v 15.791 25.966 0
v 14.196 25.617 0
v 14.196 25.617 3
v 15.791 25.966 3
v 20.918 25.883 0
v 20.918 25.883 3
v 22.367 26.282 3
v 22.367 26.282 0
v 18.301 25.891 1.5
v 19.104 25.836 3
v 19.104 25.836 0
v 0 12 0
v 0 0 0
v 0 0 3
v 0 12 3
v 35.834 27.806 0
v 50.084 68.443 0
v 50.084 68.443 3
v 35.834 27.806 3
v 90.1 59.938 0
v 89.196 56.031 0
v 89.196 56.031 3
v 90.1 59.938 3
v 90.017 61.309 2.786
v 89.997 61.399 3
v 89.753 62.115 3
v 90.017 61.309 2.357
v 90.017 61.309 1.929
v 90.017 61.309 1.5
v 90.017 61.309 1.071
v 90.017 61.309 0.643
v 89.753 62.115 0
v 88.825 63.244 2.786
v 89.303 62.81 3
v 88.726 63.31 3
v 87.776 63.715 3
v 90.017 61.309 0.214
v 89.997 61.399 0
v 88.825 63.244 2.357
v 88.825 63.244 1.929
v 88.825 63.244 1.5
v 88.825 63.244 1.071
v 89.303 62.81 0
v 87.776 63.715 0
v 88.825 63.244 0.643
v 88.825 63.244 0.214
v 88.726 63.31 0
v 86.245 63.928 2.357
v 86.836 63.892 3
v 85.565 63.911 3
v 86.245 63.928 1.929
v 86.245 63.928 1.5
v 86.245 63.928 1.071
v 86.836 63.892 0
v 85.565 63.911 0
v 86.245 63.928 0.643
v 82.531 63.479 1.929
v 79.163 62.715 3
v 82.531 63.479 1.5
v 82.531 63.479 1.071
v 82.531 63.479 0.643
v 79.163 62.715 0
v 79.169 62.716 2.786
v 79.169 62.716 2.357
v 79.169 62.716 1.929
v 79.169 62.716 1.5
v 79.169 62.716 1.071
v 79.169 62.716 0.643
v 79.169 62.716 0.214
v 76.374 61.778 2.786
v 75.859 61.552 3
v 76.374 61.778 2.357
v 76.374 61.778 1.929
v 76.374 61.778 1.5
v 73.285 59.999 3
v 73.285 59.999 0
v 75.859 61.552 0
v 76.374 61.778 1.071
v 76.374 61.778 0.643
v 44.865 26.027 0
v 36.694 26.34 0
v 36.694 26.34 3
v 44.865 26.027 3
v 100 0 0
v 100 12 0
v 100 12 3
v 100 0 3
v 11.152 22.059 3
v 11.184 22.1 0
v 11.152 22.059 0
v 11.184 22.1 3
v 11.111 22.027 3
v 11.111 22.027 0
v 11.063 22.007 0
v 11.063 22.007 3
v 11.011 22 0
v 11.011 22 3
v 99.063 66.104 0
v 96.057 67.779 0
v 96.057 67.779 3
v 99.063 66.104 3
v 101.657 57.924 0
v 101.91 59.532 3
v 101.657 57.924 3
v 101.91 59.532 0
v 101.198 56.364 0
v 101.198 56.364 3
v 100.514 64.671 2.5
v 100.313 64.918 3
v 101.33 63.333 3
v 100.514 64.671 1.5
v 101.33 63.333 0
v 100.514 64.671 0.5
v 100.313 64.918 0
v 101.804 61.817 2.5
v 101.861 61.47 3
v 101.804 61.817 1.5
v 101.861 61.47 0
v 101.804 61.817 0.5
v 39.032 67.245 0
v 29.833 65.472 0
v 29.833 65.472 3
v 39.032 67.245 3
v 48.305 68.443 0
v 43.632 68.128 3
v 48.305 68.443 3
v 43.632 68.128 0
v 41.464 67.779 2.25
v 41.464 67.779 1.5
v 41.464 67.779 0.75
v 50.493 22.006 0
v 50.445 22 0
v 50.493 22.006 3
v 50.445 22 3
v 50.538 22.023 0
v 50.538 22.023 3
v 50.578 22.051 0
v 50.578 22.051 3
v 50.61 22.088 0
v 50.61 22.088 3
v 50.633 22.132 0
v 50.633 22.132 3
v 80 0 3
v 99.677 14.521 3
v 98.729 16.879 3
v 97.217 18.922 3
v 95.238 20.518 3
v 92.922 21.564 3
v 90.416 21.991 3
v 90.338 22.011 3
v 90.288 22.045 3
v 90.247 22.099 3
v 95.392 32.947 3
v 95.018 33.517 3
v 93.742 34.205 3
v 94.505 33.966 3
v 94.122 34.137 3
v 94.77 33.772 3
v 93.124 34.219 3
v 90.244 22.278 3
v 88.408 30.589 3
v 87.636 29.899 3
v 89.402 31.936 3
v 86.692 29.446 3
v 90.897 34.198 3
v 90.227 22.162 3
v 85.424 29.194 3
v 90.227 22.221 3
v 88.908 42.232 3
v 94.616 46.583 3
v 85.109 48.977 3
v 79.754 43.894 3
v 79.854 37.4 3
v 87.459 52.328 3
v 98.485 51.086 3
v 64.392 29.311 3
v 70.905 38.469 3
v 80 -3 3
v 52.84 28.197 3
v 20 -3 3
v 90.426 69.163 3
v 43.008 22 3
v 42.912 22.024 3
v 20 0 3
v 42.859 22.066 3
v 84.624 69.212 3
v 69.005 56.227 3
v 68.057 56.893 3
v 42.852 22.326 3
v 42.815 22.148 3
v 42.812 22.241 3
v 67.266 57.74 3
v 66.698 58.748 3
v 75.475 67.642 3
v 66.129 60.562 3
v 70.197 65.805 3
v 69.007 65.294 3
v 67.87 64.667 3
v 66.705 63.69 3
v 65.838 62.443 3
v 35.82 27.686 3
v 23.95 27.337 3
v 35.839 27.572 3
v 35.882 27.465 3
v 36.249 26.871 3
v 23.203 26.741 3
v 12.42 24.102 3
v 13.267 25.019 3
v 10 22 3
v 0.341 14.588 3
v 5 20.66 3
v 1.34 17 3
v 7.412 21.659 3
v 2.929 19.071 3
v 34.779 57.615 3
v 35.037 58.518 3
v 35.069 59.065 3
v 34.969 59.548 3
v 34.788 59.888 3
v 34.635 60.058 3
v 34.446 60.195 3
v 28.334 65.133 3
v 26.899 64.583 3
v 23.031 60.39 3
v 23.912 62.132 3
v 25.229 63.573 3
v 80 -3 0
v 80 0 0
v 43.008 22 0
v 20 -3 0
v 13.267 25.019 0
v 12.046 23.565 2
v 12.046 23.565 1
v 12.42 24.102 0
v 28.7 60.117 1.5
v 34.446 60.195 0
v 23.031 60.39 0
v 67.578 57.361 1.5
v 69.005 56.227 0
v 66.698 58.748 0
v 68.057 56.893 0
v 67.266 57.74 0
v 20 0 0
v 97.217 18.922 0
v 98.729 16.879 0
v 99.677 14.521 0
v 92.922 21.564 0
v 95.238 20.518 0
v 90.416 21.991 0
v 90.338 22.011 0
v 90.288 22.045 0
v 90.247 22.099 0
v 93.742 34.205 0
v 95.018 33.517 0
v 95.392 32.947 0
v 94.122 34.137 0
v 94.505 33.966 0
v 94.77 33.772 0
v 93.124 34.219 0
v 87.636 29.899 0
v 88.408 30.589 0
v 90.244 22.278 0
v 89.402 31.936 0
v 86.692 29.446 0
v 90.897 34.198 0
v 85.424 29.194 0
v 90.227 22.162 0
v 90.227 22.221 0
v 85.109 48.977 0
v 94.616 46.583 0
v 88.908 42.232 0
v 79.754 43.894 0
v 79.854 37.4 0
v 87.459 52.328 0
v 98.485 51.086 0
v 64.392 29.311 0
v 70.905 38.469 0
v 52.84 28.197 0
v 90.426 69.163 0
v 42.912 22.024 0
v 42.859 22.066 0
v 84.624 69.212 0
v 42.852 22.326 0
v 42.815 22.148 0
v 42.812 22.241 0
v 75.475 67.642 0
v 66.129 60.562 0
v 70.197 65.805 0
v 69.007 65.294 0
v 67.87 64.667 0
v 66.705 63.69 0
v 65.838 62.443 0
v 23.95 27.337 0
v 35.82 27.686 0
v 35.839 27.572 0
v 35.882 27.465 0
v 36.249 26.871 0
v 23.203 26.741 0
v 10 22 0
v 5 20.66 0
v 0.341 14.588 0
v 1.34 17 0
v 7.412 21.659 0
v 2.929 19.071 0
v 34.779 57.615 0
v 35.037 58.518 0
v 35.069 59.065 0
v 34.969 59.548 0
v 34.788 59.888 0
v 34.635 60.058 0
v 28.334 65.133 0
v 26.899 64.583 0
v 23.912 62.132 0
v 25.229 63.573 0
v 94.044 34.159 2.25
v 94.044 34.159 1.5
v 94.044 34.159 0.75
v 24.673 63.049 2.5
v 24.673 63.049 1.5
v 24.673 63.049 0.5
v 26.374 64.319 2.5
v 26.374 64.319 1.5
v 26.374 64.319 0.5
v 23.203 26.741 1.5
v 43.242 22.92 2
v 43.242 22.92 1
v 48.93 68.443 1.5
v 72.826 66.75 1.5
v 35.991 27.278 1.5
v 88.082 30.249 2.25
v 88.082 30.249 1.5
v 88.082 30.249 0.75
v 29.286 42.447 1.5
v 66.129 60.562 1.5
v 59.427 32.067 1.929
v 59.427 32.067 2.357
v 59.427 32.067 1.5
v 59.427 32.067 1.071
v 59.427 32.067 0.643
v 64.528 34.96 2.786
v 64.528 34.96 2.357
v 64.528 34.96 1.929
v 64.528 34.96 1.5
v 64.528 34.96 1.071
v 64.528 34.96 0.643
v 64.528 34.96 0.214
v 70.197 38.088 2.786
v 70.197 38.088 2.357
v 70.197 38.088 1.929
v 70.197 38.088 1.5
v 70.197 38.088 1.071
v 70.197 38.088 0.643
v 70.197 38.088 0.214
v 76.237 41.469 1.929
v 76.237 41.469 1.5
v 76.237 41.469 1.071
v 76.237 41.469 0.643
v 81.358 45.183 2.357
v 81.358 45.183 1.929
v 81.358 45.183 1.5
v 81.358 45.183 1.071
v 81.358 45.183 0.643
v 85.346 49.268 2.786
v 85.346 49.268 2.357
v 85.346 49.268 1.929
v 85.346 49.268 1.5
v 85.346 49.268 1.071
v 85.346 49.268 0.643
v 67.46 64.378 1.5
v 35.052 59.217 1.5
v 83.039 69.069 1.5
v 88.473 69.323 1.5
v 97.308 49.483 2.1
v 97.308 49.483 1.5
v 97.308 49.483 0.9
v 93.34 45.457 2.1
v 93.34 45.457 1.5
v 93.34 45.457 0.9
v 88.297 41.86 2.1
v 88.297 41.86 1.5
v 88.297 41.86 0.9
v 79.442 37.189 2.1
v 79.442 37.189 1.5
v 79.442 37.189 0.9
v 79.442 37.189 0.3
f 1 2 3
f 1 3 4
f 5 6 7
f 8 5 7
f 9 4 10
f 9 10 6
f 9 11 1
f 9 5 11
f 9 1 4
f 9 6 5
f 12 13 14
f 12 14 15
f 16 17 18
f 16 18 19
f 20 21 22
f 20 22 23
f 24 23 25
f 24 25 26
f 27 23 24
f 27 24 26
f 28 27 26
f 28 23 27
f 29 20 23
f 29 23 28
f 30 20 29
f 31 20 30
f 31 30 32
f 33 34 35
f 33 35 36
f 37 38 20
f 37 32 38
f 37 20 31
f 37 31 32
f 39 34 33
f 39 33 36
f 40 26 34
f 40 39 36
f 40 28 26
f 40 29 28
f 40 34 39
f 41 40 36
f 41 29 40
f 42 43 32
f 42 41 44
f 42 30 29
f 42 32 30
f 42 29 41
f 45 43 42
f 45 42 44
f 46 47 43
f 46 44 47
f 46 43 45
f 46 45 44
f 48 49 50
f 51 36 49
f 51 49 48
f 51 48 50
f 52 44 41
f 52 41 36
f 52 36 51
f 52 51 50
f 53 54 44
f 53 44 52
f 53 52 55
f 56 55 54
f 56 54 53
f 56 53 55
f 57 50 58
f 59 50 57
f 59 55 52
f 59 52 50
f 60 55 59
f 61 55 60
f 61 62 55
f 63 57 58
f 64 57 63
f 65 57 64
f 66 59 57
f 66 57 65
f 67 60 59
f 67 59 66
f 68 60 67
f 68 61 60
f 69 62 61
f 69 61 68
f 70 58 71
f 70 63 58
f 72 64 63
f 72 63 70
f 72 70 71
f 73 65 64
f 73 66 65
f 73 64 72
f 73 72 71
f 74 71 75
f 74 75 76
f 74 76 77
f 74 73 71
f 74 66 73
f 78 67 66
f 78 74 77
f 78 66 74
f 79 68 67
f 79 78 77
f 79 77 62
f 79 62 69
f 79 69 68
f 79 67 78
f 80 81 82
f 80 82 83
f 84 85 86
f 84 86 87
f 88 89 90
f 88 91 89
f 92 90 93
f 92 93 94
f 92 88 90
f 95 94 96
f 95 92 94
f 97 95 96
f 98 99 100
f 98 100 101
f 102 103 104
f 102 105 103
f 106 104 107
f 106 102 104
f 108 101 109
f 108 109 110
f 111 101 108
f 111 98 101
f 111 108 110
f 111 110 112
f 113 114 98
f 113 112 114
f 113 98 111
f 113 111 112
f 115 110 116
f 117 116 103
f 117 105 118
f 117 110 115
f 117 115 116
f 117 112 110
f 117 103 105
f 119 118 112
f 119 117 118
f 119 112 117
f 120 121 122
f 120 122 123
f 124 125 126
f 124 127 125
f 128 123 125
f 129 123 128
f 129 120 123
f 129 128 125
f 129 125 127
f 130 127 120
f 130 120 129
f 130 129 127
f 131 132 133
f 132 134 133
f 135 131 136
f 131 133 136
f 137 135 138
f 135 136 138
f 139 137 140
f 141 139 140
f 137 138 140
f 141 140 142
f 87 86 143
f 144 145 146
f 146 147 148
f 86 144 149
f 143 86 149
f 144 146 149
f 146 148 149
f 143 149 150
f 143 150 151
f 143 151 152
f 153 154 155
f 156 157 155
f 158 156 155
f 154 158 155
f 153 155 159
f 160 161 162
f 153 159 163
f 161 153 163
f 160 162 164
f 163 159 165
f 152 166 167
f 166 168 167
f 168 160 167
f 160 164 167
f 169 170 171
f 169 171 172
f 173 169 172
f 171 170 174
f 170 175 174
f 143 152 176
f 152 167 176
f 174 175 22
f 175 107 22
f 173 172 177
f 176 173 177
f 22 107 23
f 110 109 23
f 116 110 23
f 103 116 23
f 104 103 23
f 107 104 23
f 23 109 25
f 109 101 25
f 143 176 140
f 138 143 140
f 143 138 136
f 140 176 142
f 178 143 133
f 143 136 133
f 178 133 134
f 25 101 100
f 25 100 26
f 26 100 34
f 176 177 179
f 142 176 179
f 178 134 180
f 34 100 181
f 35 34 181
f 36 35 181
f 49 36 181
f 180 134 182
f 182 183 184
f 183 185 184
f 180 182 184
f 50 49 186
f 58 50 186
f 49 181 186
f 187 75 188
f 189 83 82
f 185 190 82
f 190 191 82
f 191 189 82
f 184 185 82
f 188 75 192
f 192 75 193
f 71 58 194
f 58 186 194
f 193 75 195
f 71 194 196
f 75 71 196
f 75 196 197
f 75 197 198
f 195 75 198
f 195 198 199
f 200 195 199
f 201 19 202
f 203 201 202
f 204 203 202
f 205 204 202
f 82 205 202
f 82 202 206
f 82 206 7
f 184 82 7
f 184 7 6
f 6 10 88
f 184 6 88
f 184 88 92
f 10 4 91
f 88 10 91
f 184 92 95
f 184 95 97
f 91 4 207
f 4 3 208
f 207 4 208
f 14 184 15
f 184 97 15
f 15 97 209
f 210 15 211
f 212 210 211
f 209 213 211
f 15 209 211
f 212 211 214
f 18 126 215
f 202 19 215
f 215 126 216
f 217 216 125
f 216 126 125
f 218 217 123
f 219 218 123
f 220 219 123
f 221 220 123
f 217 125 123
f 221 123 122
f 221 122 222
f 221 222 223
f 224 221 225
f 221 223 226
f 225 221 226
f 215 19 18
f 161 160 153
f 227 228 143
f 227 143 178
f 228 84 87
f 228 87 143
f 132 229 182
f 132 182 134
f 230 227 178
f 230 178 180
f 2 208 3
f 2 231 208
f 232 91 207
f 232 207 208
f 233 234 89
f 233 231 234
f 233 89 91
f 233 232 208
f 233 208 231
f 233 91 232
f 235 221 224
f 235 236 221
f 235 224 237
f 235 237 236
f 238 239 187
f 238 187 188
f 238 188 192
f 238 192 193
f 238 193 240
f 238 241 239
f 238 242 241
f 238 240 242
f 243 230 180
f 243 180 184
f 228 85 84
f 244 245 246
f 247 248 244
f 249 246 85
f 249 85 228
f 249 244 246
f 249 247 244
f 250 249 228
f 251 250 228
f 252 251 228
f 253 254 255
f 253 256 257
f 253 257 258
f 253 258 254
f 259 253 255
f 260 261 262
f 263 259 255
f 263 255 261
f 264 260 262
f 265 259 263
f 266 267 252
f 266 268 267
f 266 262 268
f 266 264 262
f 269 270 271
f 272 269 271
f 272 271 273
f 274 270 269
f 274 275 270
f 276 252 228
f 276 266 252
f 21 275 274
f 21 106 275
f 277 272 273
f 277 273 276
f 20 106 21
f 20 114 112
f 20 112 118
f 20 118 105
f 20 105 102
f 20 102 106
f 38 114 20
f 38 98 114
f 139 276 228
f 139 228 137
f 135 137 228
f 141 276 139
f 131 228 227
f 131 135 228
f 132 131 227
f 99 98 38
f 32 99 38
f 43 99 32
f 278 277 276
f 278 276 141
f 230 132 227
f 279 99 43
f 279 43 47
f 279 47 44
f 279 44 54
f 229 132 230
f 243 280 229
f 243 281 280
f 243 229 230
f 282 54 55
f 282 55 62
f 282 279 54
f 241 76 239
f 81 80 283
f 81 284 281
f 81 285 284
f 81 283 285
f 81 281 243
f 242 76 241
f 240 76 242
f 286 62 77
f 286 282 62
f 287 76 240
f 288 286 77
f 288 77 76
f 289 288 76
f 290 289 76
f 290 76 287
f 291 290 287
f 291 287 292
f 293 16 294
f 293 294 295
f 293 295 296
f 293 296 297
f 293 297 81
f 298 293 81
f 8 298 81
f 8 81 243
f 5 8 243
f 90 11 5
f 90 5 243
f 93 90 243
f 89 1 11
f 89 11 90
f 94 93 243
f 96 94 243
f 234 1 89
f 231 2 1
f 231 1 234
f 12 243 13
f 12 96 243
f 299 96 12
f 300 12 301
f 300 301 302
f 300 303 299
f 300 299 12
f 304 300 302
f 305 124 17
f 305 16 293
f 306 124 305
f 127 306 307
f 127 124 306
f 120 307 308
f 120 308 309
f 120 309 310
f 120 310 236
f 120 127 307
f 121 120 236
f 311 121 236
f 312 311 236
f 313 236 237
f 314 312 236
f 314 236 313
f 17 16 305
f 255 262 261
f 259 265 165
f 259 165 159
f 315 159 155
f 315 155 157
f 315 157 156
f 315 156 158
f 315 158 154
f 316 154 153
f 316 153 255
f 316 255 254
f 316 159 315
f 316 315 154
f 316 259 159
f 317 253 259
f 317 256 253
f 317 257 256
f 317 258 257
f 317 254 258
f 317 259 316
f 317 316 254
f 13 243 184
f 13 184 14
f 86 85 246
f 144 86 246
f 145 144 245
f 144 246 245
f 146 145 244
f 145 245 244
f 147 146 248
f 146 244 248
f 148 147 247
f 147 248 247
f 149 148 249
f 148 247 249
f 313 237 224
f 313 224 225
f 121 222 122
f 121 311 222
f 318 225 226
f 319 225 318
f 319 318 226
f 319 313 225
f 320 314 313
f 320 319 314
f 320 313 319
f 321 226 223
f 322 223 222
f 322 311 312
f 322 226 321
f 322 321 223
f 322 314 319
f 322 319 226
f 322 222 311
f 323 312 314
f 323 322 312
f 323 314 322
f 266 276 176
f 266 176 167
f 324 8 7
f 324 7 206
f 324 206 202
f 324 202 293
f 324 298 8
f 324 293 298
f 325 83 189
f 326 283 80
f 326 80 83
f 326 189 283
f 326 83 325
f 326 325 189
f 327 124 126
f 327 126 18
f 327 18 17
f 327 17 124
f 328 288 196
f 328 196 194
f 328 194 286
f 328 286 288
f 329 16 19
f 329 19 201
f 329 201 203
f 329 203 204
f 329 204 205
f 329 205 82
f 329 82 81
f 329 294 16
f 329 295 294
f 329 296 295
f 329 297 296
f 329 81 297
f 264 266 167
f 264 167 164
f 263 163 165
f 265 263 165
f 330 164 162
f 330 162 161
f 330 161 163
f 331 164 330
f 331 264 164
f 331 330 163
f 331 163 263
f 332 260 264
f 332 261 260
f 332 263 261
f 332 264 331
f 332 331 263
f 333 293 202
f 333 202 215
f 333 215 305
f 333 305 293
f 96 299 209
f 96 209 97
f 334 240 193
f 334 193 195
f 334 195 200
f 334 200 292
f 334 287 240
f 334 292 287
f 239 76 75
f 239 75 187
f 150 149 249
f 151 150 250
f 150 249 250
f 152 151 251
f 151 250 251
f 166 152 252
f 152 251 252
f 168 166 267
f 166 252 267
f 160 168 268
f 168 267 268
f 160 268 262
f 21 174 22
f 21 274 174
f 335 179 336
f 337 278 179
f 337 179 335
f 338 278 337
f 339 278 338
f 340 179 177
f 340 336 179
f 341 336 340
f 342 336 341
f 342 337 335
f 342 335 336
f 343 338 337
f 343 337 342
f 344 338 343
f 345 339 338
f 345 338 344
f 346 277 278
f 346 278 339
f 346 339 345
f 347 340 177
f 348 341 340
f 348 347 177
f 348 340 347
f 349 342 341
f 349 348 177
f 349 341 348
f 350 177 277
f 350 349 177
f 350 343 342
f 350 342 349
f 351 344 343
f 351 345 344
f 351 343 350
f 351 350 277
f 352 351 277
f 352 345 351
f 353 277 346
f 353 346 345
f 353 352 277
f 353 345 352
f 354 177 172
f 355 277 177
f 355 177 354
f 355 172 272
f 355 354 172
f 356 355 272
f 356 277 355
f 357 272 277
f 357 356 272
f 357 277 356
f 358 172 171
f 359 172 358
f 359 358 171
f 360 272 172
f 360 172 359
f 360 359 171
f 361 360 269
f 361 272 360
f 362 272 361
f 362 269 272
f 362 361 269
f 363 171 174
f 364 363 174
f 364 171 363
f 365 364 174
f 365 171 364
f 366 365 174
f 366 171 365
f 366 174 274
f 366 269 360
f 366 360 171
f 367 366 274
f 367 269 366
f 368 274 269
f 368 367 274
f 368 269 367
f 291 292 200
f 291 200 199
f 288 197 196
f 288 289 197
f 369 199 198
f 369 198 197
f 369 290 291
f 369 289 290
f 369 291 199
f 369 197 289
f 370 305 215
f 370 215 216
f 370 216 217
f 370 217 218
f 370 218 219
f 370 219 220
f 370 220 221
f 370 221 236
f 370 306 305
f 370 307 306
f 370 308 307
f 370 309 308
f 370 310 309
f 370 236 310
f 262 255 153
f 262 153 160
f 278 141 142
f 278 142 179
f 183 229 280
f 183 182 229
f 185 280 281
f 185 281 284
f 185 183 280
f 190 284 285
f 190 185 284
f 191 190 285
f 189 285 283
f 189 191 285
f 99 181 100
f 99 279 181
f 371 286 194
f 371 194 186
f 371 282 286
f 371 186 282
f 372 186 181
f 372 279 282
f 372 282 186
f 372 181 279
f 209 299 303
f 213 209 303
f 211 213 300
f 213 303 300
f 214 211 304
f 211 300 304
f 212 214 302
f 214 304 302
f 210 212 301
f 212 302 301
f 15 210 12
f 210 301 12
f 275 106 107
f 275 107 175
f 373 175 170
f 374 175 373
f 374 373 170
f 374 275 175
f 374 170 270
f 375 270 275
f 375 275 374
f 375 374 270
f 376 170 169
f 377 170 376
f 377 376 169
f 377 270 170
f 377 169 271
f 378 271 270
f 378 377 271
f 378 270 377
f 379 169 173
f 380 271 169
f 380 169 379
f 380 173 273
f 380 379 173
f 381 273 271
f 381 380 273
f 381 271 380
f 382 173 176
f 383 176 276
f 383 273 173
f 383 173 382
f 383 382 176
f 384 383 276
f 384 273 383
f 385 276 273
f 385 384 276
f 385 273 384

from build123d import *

# Parameters (mm, degrees)
BOSS_EXTRUDE1_DEPTH = 3
FILLET1_R           = 10
FILLET2_R           = 0.2


with BuildPart() as part:
    # Sketch1 → Boss-Extrude1 (new body)
    with BuildSketch(Plane.XY):
        with BuildLine():
            Line((42.537984076, 22.000000982), (50.584636746, 22.000000982))
            Line((50.584636746, 22.000000982), (52.839649235, 28.197109379))
            add(Edge.make_bspline(
                [(52.839649235, 28.197109379), (54.248714684, 29.045506519), (56.431909075, 30.357383962), (59.474309712, 32.090120544), (61.944850647, 33.524828625), (64.570783761, 34.985747142), (67.336324518, 36.511397195), (70.231324588, 38.121508187), (73.255007633, 39.710376785), (76.200009812, 41.39768715), (78.906567156, 43.225136503), (81.348027085, 45.112569426), (83.490641674, 47.118195151), (85.357416855, 49.206298383), (87.428198995, 52.081305478), (88.630794744, 54.409507668), (89.196177773, 56.031354884)],
                knots=[0, 0, 0, 0, 0.105524725, 0.163385995, 0.224617296, 0.288806203, 0.356161699, 0.427252852, 0.501313646, 0.575301268, 0.644861957, 0.710669145, 0.773069231, 0.832880115, 0.890073183, 1, 1, 1, 1], degree=3))
            add(Edge.make_bspline(
                [(89.196177773, 56.031354884), (89.625842409, 57.266839405), (90.155099381, 59.015505319), (90.105779781, 61.237355295), (89.66646939, 62.439251642), (88.84893126, 63.338971158), (87.635580146, 63.810940124), (86.136489342, 63.992093331), (84.396326749, 63.803607869), (82.578344606, 63.493806461), (80.812926713, 63.154877277), (79.204447684, 62.73821432), (77.736657379, 62.289804925), (76.402583676, 61.814244169), (74.896898698, 61.102776297), (73.866127773, 60.496052109), (73.285309908, 59.99929859)],
                knots=[0, 0, 0, 0, 0.163533838, 0.22358703, 0.273097817, 0.319542769, 0.369979931, 0.431293779, 0.506061157, 0.586526579, 0.660902098, 0.729494961, 0.793064576, 0.851774175, 0.90542867, 1, 1, 1, 1], degree=3))
            Line((73.285309908, 59.99929859), (69.00462187, 56.226820091))
            add(Edge.make_bspline(
                [(69.00462187, 56.226820091), (68.473738468, 56.526672064), (67.547969563, 57.251968605), (66.901989109, 58.235224326), (66.698132425, 58.748321264)],
                knots=[0, 0, 0, 0, 0.525688222, 1, 1, 1, 1], degree=3))
            add(Edge.make_bspline(
                [(66.698132425, 58.748321264), (65.989020109, 60.529360233), (65.838085514, 62.44261368)],
                knots=[0, 0, 0, 1, 1, 1], degree=2))
            add(Edge.make_bspline(
                [(65.838085514, 62.44261368), (66.216607319, 63.204516033), (67.48287064, 64.66140426), (69.248688382, 65.425296692), (70.196959634, 65.804615243)],
                knots=[0, 0, 0, 0, 0.451020123, 1, 1, 1, 1], degree=3))
            add(Edge.make_bspline(
                [(70.196959634, 65.804615243), (72.817005486, 66.776950367), (75.474520228, 67.641988191)],
                knots=[0, 0, 0, 1, 1, 1], degree=2))
            add(Edge.make_bspline(
                [(75.474520228, 67.641988191), (77.097723123, 68.109547469), (79.616741412, 68.628507184), (83.063826554, 69.097528685), (85.75140454, 69.30616535), (88.452721605, 69.381691523), (91.938548042, 69.027238786), (94.465489273, 68.405808951), (96.057006546, 67.778813836)],
                knots=[0, 0, 0, 0, 0.242040332, 0.368376016, 0.498665213, 0.628561786, 0.755290793, 1, 1, 1, 1], degree=3))
            add(Edge.make_bspline(
                [(96.057006546, 67.778813836), (97.234318545, 67.300298489), (98.882536444, 66.423932293), (100.544073343, 64.729705469), (101.396826889, 63.351216745), (101.868398713, 61.797519742), (102.045609891, 59.41443702), (101.629471012, 57.577060636), (101.197741495, 56.363645736)],
                knots=[0, 0, 0, 0, 0.269969076, 0.3868787, 0.498157891, 0.609266408, 0.726758964, 1, 1, 1, 1], degree=3))
            add(Edge.make_bspline(
                [(101.197741495, 56.363645736), (100.627905221, 54.705185204), (99.401800162, 52.344246797), (97.33010629, 49.432482993), (95.47843029, 47.345736731), (93.329490859, 45.400929794), (90.938970266, 43.534651518), (88.270428499, 41.790403458), (84.397423166, 39.705285051), (79.587729815, 37.28204241), (72.604067537, 33.62463429), (67.574334477, 31.023637696), (64.39164298, 29.31126106)],
                knots=[0, 0, 0, 0, 0.112095574, 0.169586155, 0.228763596, 0.290550216, 0.355136688, 0.423026188, 0.494632822, 0.636984017, 0.768320184, 1, 1, 1, 1], degree=3))
            Line((64.39164298, 29.31126106), (85.423699274, 29.193981936))
            add(Edge.make_bspline(
                [(85.423699274, 29.193981936), (86.082600666, 29.252133566), (87.056534892, 29.476510222), (88.110965689, 30.221368973), (89.344492612, 31.708414679), (90.132287268, 33.128468355), (90.896725076, 34.19789124)],
                knots=[0, 0, 0, 0, 0.257232278, 0.374596102, 0.492310467, 1, 1, 1, 1], degree=3))
            add(Edge.make_bspline(
                [(90.896725076, 34.19789124), (91.748722118, 34.159580523), (92.786549209, 34.246487699), (94.041100815, 34.199570399), (94.810812918, 33.848834983), (95.196520755, 33.322492941), (95.392424841, 32.946913914)],
                knots=[0, 0, 0, 0, 0.506825366, 0.628241153, 0.743426283, 1, 1, 1, 1], degree=3))
            Line((95.392424841, 32.946913914), (90.110220598, 22.000000982))
            Line((90.110220598, 22.000000982), (100, 22.000000982))
            Line((100, 22.000000982), (100, 0))
            Line((100, 0), (80, 0))
            Line((80, 0), (80, -3))
            Line((80, -3), (20, -3))
            Line((20, -3), (20, 0))
            Line((20, 0), (0, 0))
            Line((0, 0), (0, 22.000000982))
            Line((0, 22.000000982), (11.126314779, 22.000000982))
            add(Edge.make_bspline(
                [(11.126314779, 22.000000982), (11.179175101, 22.091287797), (11.479303034, 22.615987108), (12.260783592, 24.017880313), (13.255402926, 25.187491124), (14.196177773, 25.616968644)],
                knots=[0.196060683, 0.196060683, 0.196060683, 0.196060683, 0.24891213, 0.498932816, 1, 1, 1, 1], degree=3))
            add(Edge.make_bspline(
                [(14.196177773, 25.616968644), (15.537546067, 26.136232655), (18.288283832, 25.861464595), (21.057617255, 25.705816495), (22.366623434, 26.281550349)],
                knots=[0, 0, 0, 0, 0.501451854, 1, 1, 1, 1], degree=3))
            add(Edge.make_bspline(
                [(22.366623434, 26.281550349), (23.248166371, 26.672062902), (23.949891612, 27.337062468)],
                knots=[0, 0, 0, 1, 1, 1], degree=2))
            add(Edge.make_bspline(
                [(23.949891612, 27.337062468), (25.732187491, 32.372235468), (29.257184693, 42.495036723), (32.946212686, 52.559233475), (34.778664091, 57.614623062)],
                knots=[0, 0, 0, 0, 0.498322561, 1, 1, 1, 1], degree=3))
            add(Edge.make_bspline(
                [(34.778664091, 57.614623062), (34.961841156, 58.112161275), (35.257027284, 59.078737049), (34.804433512, 59.990132521), (34.446373238, 60.194763797)],
                knots=[0, 0, 0, 0, 0.581397084, 1, 1, 1, 1], degree=3))
            add(Edge.make_bspline(
                [(34.446373238, 60.194763797), (32.529652356, 60.228560869), (28.724661476, 60.044652466), (24.911679757, 60.149389343), (23.031205138, 60.390229004)],
                knots=[0, 0, 0, 0, 0.503014916, 1, 1, 1, 1], degree=3))
            add(Edge.make_bspline(
                [(23.031205138, 60.390229004), (23.263167648, 61.057401499), (23.747411258, 62.006355534), (24.665405373, 63.067091706), (25.438689115, 63.789616743), (26.386650807, 64.343325333), (27.813668818, 65.026024955), (29.005726498, 65.340841829), (29.833394349, 65.472324391)],
                knots=[0, 0, 0, 0, 0.237267367, 0.352023708, 0.469658656, 0.590380818, 0.718477308, 1, 1, 1, 1], degree=3))
            add(Edge.make_bspline(
                [(29.833394349, 65.472324391), (32.945660374, 65.870761534), (36.807427968, 66.722765492), (41.429227523, 67.802579697), (44.509128617, 68.285055442), (46.80221991, 68.432605881), (48.304856428, 68.44339554)],
                knots=[0, 0, 0, 0, 0.501477793, 0.632810111, 0.759518477, 1, 1, 1, 1], degree=3))
            add(Edge.make_bspline(
                [(48.304856428, 68.44339554), (48.513352649, 68.44339554), (49.106263778, 68.44339554), (49.699174906, 68.44339554), (50.083589814, 68.44339554)],
                knots=[0, 0, 0, 0, 0.351648352, 1, 1, 1, 1], degree=3))
            Line((50.083589814, 68.44339554), (35.834176209, 27.806178965))
            add(Edge.make_bspline(
                [(35.834176209, 27.806178965), (35.780993555, 27.60638247), (36.11263329, 27.096689411), (36.390323638, 26.613906537), (36.694223121, 26.340189911)],
                knots=[0, 0, 0, 0, 0.324502414, 1, 1, 1, 1], degree=3))
            Line((36.694223121, 26.340189911), (44.864668782, 26.02744558))
            add(Edge.make_bspline(
                [(44.864668782, 26.02744558), (44.269729217, 25.014226453), (43.724569108, 23.691987076), (42.904365523, 22.352776547), (42.628440441, 22.079744483), (42.537984076, 22.000000982)],
                knots=[0, 0, 0, 0, 0.504343167, 0.619768133, 0.671675172, 0.671675172, 0.671675172, 0.671675172], degree=3))
        make_face()
    extrude(amount=BOSS_EXTRUDE1_DEPTH)

    # Fillet1
    # the kernel refuses this fillet: 10 mm, written as the material it takes off along each edge
    with BuildSketch(Plane(origin=(100, 22.000000982, -25), x_dir=(-1, 0, 0), z_dir=(0, 0, 1))) as fillet1_piece_1_section:
        with BuildLine():
            CenterArc((FILLET1_R, FILLET1_R), FILLET1_R, 180, 90)
            Line((0, FILLET1_R), (0, 0))
            Line((0, 0), (FILLET1_R, 0))
        make_face()
    fillet1_piece_1 = extrude(amount=53, mode=Mode.PRIVATE)
    fillet1_piece_1 = split(fillet1_piece_1, bisect_by=Plane(origin=(90.664979053, 23.149690057, 1.5), z_dir=(0.9006325457122767, -0.4345814280475224, 0)), keep=Keep.TOP, mode=Mode.PRIVATE)
    add(fillet1_piece_1, mode=Mode.SUBTRACT)
    with BuildSketch(Plane(origin=(0, 22.000000982, -25), x_dir=(0, -1, 0), z_dir=(0, 0, 1))) as fillet1_piece_2:
        with BuildLine():
            CenterArc((FILLET1_R, FILLET1_R), FILLET1_R, 180, 90)
            Line((0, FILLET1_R), (0, 0))
            Line((0, 0), (FILLET1_R, 0))
        make_face()
    extrude(amount=53, mode=Mode.SUBTRACT)

    # Fillet2
    fillet2_edges = [part.edges().sort_by_distance(p)[0] for p in [
        (90.109929036, 21.999396745, 1.5),
        (42.537984076, 22.000000982, 1.5),
        (50.584636746, 22.000000982, 1.5),
        (11.126314779, 22.000000982, 1.5),
    ]]
    fillet(fillet2_edges, radius=FILLET2_R)


solid = part.part
